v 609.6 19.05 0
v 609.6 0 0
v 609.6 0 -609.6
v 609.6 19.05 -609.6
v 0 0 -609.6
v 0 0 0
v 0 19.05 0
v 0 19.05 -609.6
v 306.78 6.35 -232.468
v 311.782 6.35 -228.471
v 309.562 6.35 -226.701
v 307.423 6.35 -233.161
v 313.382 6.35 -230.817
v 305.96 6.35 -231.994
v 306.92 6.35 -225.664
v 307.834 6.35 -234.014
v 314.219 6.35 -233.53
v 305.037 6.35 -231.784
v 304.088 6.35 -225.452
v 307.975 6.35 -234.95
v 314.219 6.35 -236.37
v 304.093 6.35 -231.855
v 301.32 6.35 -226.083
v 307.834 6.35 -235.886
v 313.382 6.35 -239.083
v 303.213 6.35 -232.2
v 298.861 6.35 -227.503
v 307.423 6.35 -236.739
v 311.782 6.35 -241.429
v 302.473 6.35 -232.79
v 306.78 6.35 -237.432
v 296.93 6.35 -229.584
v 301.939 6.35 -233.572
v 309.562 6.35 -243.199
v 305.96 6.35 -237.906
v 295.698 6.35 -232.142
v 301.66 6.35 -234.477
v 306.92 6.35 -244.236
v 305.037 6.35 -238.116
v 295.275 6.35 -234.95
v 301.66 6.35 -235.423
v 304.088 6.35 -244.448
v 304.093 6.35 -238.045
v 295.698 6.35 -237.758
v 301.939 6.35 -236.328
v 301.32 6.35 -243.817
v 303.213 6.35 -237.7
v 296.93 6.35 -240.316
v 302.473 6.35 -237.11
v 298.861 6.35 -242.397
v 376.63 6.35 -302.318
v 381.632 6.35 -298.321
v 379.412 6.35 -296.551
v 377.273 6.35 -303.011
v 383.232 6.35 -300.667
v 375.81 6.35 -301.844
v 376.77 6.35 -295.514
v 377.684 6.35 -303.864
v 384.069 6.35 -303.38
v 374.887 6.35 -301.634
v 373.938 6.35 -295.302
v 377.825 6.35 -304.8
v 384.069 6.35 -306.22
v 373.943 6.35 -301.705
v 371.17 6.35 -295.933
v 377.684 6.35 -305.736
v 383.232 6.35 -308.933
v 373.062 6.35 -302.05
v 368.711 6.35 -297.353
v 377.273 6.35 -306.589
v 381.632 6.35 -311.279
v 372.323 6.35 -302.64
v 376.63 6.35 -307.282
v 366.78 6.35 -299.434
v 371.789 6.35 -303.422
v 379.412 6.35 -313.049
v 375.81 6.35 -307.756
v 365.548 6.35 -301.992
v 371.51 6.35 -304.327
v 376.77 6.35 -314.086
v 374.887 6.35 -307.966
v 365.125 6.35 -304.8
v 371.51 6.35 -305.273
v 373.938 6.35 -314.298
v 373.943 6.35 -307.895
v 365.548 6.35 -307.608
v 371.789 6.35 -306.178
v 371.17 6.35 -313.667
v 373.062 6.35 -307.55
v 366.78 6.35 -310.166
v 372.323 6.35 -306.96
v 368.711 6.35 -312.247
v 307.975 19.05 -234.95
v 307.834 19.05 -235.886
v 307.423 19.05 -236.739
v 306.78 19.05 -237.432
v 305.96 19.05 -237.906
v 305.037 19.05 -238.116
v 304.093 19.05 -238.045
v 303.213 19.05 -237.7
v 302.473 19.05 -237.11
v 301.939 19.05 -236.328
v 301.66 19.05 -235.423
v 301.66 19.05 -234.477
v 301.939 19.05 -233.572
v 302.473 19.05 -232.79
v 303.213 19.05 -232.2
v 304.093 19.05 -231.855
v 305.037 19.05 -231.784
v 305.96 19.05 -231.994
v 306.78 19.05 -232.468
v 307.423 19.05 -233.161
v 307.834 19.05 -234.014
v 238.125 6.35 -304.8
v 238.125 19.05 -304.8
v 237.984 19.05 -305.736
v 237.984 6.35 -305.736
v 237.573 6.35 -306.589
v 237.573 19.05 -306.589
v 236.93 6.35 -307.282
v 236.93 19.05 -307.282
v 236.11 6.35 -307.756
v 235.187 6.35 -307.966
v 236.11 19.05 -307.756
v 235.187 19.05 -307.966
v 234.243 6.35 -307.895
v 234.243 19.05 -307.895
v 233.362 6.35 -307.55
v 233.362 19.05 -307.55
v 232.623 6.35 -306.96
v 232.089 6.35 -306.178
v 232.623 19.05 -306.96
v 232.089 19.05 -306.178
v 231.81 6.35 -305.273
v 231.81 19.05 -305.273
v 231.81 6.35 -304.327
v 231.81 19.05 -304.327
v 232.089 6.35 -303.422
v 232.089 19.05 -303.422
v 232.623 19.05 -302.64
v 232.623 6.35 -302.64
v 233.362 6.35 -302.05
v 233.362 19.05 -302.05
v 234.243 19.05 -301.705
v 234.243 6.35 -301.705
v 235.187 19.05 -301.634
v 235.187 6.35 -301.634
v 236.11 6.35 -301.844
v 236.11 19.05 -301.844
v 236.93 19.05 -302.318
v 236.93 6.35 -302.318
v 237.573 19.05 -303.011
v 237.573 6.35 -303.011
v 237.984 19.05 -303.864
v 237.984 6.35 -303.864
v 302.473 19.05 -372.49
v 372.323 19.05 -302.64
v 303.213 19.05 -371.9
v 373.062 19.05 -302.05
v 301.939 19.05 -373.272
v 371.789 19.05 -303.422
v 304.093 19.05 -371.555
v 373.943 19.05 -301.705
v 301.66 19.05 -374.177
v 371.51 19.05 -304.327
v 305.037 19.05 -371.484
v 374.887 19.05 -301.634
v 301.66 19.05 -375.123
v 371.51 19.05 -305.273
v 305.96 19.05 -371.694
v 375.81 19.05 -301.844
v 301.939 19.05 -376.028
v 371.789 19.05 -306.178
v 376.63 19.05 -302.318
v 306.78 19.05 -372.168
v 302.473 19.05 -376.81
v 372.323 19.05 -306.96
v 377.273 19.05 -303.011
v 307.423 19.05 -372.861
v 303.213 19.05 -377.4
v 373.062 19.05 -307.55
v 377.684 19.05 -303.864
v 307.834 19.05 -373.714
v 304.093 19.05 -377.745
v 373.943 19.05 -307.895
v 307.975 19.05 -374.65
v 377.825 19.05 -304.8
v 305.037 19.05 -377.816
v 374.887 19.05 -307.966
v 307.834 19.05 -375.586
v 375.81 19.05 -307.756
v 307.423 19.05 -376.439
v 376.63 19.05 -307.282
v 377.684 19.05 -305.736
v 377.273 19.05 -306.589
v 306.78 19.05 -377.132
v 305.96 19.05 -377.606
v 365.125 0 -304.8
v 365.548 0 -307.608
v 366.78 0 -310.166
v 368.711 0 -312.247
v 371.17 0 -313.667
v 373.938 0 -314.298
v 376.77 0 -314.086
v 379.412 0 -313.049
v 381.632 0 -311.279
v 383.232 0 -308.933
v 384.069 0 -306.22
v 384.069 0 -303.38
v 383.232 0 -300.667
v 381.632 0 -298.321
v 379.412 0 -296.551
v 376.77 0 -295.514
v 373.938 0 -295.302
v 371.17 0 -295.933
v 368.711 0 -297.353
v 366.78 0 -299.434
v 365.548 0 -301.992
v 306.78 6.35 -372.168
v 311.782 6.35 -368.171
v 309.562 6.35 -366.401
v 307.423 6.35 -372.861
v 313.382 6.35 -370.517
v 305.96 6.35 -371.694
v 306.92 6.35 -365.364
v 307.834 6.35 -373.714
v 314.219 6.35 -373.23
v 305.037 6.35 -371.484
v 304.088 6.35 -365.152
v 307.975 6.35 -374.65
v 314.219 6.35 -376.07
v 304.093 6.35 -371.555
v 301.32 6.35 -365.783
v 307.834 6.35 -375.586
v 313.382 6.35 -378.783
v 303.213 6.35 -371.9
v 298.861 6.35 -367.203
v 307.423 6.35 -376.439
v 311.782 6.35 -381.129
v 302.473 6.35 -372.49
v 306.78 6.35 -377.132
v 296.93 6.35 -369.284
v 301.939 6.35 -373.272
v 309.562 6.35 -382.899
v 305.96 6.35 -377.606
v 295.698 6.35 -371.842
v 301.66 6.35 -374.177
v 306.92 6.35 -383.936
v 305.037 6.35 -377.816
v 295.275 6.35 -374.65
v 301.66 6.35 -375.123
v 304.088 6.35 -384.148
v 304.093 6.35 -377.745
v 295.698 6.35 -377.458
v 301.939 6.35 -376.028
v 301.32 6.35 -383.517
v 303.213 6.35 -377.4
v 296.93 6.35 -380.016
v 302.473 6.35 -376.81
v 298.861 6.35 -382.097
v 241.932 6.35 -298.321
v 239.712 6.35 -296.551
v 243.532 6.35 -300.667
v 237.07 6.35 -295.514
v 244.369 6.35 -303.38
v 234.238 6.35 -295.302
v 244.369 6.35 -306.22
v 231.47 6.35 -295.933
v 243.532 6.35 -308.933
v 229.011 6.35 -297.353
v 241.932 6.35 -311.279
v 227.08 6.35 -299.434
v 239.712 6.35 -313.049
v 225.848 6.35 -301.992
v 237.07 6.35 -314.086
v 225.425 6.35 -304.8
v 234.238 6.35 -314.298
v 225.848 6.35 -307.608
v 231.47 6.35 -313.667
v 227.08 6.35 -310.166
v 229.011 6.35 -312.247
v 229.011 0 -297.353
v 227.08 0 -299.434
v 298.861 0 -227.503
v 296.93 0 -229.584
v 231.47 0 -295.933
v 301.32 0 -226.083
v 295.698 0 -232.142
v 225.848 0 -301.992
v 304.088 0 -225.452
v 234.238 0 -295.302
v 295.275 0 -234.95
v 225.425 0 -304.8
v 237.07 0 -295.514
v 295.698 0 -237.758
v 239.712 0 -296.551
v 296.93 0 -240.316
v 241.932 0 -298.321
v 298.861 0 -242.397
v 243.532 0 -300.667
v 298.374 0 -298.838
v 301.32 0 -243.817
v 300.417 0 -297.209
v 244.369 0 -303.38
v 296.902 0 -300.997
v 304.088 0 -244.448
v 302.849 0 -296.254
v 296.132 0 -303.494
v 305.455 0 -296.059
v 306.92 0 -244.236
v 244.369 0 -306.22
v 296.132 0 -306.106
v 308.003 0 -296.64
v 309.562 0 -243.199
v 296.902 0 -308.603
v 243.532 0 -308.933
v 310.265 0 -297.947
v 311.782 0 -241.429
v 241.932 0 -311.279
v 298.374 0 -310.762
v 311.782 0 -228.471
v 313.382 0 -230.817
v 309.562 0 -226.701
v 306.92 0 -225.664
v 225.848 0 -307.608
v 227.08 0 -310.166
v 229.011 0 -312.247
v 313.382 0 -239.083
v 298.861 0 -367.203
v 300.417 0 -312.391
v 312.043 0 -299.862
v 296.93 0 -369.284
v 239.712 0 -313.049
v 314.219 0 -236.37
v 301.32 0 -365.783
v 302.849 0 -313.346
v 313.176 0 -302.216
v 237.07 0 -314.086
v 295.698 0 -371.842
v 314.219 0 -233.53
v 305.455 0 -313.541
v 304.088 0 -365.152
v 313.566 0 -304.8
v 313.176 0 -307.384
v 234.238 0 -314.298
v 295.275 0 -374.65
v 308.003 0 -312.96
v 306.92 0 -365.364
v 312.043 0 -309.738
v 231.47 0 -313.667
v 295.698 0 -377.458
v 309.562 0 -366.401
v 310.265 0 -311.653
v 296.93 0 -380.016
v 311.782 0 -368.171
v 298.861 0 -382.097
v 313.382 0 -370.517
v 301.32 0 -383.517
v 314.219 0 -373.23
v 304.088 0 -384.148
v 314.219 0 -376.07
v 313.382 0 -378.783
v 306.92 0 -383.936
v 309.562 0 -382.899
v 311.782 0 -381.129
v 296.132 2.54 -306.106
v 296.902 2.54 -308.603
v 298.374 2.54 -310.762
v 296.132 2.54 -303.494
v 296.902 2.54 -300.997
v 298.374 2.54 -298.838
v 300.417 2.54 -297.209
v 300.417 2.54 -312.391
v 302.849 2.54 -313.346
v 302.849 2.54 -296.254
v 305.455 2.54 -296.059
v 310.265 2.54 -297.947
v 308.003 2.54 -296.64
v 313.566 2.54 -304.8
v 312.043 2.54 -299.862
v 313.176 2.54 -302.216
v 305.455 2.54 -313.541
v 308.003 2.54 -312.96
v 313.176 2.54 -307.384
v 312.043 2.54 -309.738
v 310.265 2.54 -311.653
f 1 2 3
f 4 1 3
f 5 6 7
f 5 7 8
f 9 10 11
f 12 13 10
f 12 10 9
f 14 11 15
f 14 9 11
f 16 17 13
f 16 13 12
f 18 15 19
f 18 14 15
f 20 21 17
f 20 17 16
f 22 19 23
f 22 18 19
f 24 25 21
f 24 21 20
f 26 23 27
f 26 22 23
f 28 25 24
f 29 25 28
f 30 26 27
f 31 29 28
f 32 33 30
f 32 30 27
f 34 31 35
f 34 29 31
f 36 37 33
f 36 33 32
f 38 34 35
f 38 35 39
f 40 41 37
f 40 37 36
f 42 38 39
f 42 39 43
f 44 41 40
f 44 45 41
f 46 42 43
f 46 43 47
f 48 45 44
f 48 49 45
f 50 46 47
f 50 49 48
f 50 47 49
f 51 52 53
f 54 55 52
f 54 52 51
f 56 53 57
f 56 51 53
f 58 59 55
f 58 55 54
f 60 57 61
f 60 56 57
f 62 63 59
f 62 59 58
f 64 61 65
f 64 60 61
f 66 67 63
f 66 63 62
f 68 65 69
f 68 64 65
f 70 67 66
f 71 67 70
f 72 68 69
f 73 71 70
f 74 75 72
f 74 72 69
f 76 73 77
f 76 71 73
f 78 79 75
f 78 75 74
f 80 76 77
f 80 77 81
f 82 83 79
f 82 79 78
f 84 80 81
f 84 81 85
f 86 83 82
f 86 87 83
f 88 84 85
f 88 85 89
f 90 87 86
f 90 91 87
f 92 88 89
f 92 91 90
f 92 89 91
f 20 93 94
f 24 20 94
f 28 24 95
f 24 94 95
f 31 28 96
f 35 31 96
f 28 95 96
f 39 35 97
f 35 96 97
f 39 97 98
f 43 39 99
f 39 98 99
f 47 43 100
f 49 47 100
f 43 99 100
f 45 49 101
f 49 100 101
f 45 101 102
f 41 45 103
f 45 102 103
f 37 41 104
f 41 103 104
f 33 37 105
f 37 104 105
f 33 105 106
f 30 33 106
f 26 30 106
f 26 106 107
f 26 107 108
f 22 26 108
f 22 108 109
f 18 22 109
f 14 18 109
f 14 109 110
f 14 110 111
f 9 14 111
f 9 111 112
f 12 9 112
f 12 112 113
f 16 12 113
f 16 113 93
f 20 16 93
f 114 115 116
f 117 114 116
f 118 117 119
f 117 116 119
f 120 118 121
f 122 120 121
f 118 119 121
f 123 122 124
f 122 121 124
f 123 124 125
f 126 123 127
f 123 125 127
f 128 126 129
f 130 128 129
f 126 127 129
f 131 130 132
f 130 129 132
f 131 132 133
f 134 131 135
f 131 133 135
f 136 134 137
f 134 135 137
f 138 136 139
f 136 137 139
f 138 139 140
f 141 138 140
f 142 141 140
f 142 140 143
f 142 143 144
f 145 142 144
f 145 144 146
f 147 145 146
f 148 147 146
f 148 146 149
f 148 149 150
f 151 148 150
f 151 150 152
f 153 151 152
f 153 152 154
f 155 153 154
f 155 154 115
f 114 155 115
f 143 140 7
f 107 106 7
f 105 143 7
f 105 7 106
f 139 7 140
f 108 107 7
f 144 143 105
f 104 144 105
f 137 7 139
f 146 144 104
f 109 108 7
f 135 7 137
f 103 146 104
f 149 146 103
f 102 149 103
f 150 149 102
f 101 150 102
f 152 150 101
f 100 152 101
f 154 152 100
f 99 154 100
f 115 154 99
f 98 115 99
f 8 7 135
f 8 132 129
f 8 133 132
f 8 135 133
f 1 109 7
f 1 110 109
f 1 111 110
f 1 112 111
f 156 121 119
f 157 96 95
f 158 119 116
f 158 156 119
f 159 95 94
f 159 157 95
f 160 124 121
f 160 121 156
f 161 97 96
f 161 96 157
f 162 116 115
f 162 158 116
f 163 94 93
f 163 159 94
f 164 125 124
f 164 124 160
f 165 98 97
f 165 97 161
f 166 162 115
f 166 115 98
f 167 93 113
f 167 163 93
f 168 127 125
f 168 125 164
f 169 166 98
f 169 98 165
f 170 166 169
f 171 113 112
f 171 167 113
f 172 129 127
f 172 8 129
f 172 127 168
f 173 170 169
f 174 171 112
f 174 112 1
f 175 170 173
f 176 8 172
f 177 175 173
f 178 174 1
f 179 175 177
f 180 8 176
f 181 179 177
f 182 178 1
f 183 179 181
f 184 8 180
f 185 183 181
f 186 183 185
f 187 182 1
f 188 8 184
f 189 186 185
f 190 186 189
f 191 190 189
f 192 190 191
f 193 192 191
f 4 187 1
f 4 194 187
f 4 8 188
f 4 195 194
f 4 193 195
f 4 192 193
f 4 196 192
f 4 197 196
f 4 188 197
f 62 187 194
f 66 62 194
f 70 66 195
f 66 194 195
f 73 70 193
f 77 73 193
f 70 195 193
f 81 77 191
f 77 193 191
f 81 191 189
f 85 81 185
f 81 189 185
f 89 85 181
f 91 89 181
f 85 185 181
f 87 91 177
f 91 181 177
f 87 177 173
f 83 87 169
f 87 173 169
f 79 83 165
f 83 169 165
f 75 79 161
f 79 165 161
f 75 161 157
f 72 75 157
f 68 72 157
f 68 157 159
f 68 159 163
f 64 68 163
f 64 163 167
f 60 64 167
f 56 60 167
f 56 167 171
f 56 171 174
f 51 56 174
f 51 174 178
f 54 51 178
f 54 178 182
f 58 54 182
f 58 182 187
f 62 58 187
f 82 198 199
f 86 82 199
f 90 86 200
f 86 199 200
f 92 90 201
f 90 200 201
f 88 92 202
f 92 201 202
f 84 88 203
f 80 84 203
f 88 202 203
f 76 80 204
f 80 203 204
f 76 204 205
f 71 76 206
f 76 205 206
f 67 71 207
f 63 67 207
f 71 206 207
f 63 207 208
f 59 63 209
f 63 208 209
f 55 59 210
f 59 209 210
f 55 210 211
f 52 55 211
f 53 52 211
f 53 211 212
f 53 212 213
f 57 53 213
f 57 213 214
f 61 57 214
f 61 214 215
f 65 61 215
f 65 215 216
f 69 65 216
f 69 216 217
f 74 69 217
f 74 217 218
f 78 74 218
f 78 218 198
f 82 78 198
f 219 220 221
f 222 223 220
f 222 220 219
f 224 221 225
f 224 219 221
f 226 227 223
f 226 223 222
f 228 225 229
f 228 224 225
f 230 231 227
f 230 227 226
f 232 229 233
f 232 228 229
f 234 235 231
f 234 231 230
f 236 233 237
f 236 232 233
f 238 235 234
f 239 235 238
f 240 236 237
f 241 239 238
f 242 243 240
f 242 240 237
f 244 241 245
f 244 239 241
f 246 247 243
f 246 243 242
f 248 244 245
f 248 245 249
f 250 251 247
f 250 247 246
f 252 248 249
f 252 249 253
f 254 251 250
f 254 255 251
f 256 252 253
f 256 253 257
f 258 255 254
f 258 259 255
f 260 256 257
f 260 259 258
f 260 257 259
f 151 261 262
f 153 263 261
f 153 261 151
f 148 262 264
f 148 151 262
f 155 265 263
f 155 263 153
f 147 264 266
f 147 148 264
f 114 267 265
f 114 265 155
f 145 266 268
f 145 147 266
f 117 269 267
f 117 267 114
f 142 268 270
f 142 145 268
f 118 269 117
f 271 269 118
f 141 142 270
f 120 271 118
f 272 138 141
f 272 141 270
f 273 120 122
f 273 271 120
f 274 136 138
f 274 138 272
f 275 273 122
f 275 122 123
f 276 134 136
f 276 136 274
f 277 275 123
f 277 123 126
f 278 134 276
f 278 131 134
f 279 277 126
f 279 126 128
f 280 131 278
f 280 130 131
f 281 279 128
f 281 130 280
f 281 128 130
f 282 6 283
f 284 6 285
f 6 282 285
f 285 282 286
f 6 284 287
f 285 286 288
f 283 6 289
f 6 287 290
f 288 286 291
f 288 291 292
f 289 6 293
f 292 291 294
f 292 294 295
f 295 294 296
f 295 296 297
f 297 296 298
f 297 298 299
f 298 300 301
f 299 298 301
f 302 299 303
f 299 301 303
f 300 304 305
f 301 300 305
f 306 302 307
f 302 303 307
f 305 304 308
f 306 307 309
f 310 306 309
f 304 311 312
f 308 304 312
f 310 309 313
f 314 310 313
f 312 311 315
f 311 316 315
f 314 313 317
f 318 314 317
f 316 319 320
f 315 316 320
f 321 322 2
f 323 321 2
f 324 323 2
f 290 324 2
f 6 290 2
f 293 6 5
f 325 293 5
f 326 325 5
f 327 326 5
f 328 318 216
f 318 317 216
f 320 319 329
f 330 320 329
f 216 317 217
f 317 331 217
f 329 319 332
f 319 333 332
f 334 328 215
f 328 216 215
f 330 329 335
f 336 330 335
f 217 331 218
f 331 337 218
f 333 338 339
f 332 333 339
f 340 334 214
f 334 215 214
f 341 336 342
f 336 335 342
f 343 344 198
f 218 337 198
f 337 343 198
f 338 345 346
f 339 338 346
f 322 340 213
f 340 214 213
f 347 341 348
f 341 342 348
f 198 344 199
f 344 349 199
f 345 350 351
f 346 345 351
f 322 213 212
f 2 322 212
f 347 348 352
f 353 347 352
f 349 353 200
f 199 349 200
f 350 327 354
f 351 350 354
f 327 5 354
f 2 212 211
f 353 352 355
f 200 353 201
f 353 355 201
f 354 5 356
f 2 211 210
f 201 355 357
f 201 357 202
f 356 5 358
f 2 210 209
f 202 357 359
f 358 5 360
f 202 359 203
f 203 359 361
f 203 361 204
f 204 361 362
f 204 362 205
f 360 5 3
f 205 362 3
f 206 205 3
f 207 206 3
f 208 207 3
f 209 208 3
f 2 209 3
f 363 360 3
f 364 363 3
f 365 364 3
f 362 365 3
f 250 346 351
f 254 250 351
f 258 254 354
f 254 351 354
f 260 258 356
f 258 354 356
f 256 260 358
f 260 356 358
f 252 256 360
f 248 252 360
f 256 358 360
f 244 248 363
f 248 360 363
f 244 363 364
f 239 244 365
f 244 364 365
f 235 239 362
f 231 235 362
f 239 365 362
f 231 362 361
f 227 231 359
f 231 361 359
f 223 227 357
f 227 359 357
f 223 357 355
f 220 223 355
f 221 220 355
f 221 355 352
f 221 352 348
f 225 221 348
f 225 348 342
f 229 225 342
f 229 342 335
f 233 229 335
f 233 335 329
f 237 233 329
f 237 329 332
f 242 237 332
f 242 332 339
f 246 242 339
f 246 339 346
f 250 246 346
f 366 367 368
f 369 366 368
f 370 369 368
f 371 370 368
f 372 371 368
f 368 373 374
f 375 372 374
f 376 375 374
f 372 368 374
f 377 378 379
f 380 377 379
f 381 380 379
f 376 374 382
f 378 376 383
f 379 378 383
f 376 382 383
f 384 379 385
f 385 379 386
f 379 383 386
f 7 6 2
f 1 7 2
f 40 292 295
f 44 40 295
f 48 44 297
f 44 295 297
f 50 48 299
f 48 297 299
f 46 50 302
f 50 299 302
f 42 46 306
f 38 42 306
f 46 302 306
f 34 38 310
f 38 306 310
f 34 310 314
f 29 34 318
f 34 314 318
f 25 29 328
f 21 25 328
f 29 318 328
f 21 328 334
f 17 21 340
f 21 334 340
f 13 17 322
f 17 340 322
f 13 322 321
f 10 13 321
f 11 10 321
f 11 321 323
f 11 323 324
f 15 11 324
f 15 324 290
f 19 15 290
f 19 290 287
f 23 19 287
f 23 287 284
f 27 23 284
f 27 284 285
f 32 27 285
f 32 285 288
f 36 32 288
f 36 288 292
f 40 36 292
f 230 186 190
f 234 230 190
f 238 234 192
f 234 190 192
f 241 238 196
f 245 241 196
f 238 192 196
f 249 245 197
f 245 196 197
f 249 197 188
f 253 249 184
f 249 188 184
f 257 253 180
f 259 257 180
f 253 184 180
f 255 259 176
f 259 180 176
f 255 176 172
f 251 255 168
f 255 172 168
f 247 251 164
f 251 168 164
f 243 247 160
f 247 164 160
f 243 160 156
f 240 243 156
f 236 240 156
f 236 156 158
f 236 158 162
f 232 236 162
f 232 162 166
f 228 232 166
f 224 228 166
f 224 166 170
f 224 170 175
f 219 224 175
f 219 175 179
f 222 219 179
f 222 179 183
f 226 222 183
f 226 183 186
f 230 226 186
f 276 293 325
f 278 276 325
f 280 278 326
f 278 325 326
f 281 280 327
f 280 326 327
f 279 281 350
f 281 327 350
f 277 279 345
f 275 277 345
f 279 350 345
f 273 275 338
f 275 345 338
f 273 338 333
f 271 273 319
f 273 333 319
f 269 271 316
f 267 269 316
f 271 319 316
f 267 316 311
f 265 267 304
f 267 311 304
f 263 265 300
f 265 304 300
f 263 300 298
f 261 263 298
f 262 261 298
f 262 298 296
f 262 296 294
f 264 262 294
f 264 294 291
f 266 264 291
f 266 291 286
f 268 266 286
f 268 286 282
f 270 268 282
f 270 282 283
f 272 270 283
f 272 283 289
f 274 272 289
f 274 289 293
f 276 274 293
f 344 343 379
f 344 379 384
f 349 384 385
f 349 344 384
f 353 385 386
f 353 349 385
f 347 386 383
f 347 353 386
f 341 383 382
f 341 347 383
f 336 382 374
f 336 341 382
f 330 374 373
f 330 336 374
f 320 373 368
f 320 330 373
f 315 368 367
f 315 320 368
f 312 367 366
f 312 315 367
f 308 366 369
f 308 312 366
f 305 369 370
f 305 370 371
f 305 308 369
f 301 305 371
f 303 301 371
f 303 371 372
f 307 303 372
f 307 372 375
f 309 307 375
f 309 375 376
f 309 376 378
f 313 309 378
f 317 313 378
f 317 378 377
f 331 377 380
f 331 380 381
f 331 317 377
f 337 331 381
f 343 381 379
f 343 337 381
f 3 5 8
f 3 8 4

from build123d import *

# Parameters (mm, degrees)
SKETCH1_W           = 609.6
SKETCH1_H           = 609.6
BOSS_EXTRUDE1_DEPTH = 19.05
SKETCH2_R           = 3.175
CUT_EXTRUDE1_DEPTH  = 20.05
SKETCH3_R           = 8.765833612
CUT_EXTRUDE2_DEPTH  = 2.54
HOLE1_D             = 6.35
HOLE1_DEPTH         = 25.4
HOLE1_CBORE_D       = 19.05
HOLE1_CBORE_DEPTH   = 6.35


with BuildPart() as part:
    # Sketch1 → Boss-Extrude1 (new body)
    with BuildSketch(Plane(origin=(0, 0, 0), x_dir=(1, 0, 0), z_dir=(0, 1, 0))):
        with Locations((304.8, 304.8)):
            Rectangle(SKETCH1_W, SKETCH1_H)
    extrude(amount=BOSS_EXTRUDE1_DEPTH)

    # Sketch2 → Cut-Extrude1 (cut, through all)
    with BuildSketch(Plane(origin=(0, 19.05, 0), x_dir=(1, 0, 0), z_dir=(0, 1, 0))):
        with Locations((304.8, 374.65)):
            Circle(SKETCH2_R)
        with Locations((234.95, 304.8)):
            Circle(SKETCH2_R)
        with Locations((374.65, 304.8)):
            Circle(SKETCH2_R)
        with Locations((304.8, 234.95)):
            Circle(SKETCH2_R)
    extrude(amount=-CUT_EXTRUDE1_DEPTH, mode=Mode.SUBTRACT)

    # Sketch3 → Cut-Extrude2 (cut)
    with BuildSketch(Plane(origin=(0, 0, 0), x_dir=(1, 0, 0), z_dir=(0, 1, 0))):
        with Locations((304.8, 304.8)):
            Circle(SKETCH3_R)
    extrude(amount=CUT_EXTRUDE2_DEPTH, mode=Mode.SUBTRACT)

    # Hole1
    with Locations(Plane(origin=(0, 0, 0), x_dir=(-1, 0, 0), z_dir=(0, -1, 0))):
        with Locations((-234.95, 304.8), (-304.8, 234.95), (-374.65, 304.8), (-304.8, 374.65)):
            CounterBoreHole(HOLE1_D / 2, HOLE1_CBORE_D / 2, HOLE1_CBORE_DEPTH, depth=HOLE1_DEPTH)


solid = part.part
